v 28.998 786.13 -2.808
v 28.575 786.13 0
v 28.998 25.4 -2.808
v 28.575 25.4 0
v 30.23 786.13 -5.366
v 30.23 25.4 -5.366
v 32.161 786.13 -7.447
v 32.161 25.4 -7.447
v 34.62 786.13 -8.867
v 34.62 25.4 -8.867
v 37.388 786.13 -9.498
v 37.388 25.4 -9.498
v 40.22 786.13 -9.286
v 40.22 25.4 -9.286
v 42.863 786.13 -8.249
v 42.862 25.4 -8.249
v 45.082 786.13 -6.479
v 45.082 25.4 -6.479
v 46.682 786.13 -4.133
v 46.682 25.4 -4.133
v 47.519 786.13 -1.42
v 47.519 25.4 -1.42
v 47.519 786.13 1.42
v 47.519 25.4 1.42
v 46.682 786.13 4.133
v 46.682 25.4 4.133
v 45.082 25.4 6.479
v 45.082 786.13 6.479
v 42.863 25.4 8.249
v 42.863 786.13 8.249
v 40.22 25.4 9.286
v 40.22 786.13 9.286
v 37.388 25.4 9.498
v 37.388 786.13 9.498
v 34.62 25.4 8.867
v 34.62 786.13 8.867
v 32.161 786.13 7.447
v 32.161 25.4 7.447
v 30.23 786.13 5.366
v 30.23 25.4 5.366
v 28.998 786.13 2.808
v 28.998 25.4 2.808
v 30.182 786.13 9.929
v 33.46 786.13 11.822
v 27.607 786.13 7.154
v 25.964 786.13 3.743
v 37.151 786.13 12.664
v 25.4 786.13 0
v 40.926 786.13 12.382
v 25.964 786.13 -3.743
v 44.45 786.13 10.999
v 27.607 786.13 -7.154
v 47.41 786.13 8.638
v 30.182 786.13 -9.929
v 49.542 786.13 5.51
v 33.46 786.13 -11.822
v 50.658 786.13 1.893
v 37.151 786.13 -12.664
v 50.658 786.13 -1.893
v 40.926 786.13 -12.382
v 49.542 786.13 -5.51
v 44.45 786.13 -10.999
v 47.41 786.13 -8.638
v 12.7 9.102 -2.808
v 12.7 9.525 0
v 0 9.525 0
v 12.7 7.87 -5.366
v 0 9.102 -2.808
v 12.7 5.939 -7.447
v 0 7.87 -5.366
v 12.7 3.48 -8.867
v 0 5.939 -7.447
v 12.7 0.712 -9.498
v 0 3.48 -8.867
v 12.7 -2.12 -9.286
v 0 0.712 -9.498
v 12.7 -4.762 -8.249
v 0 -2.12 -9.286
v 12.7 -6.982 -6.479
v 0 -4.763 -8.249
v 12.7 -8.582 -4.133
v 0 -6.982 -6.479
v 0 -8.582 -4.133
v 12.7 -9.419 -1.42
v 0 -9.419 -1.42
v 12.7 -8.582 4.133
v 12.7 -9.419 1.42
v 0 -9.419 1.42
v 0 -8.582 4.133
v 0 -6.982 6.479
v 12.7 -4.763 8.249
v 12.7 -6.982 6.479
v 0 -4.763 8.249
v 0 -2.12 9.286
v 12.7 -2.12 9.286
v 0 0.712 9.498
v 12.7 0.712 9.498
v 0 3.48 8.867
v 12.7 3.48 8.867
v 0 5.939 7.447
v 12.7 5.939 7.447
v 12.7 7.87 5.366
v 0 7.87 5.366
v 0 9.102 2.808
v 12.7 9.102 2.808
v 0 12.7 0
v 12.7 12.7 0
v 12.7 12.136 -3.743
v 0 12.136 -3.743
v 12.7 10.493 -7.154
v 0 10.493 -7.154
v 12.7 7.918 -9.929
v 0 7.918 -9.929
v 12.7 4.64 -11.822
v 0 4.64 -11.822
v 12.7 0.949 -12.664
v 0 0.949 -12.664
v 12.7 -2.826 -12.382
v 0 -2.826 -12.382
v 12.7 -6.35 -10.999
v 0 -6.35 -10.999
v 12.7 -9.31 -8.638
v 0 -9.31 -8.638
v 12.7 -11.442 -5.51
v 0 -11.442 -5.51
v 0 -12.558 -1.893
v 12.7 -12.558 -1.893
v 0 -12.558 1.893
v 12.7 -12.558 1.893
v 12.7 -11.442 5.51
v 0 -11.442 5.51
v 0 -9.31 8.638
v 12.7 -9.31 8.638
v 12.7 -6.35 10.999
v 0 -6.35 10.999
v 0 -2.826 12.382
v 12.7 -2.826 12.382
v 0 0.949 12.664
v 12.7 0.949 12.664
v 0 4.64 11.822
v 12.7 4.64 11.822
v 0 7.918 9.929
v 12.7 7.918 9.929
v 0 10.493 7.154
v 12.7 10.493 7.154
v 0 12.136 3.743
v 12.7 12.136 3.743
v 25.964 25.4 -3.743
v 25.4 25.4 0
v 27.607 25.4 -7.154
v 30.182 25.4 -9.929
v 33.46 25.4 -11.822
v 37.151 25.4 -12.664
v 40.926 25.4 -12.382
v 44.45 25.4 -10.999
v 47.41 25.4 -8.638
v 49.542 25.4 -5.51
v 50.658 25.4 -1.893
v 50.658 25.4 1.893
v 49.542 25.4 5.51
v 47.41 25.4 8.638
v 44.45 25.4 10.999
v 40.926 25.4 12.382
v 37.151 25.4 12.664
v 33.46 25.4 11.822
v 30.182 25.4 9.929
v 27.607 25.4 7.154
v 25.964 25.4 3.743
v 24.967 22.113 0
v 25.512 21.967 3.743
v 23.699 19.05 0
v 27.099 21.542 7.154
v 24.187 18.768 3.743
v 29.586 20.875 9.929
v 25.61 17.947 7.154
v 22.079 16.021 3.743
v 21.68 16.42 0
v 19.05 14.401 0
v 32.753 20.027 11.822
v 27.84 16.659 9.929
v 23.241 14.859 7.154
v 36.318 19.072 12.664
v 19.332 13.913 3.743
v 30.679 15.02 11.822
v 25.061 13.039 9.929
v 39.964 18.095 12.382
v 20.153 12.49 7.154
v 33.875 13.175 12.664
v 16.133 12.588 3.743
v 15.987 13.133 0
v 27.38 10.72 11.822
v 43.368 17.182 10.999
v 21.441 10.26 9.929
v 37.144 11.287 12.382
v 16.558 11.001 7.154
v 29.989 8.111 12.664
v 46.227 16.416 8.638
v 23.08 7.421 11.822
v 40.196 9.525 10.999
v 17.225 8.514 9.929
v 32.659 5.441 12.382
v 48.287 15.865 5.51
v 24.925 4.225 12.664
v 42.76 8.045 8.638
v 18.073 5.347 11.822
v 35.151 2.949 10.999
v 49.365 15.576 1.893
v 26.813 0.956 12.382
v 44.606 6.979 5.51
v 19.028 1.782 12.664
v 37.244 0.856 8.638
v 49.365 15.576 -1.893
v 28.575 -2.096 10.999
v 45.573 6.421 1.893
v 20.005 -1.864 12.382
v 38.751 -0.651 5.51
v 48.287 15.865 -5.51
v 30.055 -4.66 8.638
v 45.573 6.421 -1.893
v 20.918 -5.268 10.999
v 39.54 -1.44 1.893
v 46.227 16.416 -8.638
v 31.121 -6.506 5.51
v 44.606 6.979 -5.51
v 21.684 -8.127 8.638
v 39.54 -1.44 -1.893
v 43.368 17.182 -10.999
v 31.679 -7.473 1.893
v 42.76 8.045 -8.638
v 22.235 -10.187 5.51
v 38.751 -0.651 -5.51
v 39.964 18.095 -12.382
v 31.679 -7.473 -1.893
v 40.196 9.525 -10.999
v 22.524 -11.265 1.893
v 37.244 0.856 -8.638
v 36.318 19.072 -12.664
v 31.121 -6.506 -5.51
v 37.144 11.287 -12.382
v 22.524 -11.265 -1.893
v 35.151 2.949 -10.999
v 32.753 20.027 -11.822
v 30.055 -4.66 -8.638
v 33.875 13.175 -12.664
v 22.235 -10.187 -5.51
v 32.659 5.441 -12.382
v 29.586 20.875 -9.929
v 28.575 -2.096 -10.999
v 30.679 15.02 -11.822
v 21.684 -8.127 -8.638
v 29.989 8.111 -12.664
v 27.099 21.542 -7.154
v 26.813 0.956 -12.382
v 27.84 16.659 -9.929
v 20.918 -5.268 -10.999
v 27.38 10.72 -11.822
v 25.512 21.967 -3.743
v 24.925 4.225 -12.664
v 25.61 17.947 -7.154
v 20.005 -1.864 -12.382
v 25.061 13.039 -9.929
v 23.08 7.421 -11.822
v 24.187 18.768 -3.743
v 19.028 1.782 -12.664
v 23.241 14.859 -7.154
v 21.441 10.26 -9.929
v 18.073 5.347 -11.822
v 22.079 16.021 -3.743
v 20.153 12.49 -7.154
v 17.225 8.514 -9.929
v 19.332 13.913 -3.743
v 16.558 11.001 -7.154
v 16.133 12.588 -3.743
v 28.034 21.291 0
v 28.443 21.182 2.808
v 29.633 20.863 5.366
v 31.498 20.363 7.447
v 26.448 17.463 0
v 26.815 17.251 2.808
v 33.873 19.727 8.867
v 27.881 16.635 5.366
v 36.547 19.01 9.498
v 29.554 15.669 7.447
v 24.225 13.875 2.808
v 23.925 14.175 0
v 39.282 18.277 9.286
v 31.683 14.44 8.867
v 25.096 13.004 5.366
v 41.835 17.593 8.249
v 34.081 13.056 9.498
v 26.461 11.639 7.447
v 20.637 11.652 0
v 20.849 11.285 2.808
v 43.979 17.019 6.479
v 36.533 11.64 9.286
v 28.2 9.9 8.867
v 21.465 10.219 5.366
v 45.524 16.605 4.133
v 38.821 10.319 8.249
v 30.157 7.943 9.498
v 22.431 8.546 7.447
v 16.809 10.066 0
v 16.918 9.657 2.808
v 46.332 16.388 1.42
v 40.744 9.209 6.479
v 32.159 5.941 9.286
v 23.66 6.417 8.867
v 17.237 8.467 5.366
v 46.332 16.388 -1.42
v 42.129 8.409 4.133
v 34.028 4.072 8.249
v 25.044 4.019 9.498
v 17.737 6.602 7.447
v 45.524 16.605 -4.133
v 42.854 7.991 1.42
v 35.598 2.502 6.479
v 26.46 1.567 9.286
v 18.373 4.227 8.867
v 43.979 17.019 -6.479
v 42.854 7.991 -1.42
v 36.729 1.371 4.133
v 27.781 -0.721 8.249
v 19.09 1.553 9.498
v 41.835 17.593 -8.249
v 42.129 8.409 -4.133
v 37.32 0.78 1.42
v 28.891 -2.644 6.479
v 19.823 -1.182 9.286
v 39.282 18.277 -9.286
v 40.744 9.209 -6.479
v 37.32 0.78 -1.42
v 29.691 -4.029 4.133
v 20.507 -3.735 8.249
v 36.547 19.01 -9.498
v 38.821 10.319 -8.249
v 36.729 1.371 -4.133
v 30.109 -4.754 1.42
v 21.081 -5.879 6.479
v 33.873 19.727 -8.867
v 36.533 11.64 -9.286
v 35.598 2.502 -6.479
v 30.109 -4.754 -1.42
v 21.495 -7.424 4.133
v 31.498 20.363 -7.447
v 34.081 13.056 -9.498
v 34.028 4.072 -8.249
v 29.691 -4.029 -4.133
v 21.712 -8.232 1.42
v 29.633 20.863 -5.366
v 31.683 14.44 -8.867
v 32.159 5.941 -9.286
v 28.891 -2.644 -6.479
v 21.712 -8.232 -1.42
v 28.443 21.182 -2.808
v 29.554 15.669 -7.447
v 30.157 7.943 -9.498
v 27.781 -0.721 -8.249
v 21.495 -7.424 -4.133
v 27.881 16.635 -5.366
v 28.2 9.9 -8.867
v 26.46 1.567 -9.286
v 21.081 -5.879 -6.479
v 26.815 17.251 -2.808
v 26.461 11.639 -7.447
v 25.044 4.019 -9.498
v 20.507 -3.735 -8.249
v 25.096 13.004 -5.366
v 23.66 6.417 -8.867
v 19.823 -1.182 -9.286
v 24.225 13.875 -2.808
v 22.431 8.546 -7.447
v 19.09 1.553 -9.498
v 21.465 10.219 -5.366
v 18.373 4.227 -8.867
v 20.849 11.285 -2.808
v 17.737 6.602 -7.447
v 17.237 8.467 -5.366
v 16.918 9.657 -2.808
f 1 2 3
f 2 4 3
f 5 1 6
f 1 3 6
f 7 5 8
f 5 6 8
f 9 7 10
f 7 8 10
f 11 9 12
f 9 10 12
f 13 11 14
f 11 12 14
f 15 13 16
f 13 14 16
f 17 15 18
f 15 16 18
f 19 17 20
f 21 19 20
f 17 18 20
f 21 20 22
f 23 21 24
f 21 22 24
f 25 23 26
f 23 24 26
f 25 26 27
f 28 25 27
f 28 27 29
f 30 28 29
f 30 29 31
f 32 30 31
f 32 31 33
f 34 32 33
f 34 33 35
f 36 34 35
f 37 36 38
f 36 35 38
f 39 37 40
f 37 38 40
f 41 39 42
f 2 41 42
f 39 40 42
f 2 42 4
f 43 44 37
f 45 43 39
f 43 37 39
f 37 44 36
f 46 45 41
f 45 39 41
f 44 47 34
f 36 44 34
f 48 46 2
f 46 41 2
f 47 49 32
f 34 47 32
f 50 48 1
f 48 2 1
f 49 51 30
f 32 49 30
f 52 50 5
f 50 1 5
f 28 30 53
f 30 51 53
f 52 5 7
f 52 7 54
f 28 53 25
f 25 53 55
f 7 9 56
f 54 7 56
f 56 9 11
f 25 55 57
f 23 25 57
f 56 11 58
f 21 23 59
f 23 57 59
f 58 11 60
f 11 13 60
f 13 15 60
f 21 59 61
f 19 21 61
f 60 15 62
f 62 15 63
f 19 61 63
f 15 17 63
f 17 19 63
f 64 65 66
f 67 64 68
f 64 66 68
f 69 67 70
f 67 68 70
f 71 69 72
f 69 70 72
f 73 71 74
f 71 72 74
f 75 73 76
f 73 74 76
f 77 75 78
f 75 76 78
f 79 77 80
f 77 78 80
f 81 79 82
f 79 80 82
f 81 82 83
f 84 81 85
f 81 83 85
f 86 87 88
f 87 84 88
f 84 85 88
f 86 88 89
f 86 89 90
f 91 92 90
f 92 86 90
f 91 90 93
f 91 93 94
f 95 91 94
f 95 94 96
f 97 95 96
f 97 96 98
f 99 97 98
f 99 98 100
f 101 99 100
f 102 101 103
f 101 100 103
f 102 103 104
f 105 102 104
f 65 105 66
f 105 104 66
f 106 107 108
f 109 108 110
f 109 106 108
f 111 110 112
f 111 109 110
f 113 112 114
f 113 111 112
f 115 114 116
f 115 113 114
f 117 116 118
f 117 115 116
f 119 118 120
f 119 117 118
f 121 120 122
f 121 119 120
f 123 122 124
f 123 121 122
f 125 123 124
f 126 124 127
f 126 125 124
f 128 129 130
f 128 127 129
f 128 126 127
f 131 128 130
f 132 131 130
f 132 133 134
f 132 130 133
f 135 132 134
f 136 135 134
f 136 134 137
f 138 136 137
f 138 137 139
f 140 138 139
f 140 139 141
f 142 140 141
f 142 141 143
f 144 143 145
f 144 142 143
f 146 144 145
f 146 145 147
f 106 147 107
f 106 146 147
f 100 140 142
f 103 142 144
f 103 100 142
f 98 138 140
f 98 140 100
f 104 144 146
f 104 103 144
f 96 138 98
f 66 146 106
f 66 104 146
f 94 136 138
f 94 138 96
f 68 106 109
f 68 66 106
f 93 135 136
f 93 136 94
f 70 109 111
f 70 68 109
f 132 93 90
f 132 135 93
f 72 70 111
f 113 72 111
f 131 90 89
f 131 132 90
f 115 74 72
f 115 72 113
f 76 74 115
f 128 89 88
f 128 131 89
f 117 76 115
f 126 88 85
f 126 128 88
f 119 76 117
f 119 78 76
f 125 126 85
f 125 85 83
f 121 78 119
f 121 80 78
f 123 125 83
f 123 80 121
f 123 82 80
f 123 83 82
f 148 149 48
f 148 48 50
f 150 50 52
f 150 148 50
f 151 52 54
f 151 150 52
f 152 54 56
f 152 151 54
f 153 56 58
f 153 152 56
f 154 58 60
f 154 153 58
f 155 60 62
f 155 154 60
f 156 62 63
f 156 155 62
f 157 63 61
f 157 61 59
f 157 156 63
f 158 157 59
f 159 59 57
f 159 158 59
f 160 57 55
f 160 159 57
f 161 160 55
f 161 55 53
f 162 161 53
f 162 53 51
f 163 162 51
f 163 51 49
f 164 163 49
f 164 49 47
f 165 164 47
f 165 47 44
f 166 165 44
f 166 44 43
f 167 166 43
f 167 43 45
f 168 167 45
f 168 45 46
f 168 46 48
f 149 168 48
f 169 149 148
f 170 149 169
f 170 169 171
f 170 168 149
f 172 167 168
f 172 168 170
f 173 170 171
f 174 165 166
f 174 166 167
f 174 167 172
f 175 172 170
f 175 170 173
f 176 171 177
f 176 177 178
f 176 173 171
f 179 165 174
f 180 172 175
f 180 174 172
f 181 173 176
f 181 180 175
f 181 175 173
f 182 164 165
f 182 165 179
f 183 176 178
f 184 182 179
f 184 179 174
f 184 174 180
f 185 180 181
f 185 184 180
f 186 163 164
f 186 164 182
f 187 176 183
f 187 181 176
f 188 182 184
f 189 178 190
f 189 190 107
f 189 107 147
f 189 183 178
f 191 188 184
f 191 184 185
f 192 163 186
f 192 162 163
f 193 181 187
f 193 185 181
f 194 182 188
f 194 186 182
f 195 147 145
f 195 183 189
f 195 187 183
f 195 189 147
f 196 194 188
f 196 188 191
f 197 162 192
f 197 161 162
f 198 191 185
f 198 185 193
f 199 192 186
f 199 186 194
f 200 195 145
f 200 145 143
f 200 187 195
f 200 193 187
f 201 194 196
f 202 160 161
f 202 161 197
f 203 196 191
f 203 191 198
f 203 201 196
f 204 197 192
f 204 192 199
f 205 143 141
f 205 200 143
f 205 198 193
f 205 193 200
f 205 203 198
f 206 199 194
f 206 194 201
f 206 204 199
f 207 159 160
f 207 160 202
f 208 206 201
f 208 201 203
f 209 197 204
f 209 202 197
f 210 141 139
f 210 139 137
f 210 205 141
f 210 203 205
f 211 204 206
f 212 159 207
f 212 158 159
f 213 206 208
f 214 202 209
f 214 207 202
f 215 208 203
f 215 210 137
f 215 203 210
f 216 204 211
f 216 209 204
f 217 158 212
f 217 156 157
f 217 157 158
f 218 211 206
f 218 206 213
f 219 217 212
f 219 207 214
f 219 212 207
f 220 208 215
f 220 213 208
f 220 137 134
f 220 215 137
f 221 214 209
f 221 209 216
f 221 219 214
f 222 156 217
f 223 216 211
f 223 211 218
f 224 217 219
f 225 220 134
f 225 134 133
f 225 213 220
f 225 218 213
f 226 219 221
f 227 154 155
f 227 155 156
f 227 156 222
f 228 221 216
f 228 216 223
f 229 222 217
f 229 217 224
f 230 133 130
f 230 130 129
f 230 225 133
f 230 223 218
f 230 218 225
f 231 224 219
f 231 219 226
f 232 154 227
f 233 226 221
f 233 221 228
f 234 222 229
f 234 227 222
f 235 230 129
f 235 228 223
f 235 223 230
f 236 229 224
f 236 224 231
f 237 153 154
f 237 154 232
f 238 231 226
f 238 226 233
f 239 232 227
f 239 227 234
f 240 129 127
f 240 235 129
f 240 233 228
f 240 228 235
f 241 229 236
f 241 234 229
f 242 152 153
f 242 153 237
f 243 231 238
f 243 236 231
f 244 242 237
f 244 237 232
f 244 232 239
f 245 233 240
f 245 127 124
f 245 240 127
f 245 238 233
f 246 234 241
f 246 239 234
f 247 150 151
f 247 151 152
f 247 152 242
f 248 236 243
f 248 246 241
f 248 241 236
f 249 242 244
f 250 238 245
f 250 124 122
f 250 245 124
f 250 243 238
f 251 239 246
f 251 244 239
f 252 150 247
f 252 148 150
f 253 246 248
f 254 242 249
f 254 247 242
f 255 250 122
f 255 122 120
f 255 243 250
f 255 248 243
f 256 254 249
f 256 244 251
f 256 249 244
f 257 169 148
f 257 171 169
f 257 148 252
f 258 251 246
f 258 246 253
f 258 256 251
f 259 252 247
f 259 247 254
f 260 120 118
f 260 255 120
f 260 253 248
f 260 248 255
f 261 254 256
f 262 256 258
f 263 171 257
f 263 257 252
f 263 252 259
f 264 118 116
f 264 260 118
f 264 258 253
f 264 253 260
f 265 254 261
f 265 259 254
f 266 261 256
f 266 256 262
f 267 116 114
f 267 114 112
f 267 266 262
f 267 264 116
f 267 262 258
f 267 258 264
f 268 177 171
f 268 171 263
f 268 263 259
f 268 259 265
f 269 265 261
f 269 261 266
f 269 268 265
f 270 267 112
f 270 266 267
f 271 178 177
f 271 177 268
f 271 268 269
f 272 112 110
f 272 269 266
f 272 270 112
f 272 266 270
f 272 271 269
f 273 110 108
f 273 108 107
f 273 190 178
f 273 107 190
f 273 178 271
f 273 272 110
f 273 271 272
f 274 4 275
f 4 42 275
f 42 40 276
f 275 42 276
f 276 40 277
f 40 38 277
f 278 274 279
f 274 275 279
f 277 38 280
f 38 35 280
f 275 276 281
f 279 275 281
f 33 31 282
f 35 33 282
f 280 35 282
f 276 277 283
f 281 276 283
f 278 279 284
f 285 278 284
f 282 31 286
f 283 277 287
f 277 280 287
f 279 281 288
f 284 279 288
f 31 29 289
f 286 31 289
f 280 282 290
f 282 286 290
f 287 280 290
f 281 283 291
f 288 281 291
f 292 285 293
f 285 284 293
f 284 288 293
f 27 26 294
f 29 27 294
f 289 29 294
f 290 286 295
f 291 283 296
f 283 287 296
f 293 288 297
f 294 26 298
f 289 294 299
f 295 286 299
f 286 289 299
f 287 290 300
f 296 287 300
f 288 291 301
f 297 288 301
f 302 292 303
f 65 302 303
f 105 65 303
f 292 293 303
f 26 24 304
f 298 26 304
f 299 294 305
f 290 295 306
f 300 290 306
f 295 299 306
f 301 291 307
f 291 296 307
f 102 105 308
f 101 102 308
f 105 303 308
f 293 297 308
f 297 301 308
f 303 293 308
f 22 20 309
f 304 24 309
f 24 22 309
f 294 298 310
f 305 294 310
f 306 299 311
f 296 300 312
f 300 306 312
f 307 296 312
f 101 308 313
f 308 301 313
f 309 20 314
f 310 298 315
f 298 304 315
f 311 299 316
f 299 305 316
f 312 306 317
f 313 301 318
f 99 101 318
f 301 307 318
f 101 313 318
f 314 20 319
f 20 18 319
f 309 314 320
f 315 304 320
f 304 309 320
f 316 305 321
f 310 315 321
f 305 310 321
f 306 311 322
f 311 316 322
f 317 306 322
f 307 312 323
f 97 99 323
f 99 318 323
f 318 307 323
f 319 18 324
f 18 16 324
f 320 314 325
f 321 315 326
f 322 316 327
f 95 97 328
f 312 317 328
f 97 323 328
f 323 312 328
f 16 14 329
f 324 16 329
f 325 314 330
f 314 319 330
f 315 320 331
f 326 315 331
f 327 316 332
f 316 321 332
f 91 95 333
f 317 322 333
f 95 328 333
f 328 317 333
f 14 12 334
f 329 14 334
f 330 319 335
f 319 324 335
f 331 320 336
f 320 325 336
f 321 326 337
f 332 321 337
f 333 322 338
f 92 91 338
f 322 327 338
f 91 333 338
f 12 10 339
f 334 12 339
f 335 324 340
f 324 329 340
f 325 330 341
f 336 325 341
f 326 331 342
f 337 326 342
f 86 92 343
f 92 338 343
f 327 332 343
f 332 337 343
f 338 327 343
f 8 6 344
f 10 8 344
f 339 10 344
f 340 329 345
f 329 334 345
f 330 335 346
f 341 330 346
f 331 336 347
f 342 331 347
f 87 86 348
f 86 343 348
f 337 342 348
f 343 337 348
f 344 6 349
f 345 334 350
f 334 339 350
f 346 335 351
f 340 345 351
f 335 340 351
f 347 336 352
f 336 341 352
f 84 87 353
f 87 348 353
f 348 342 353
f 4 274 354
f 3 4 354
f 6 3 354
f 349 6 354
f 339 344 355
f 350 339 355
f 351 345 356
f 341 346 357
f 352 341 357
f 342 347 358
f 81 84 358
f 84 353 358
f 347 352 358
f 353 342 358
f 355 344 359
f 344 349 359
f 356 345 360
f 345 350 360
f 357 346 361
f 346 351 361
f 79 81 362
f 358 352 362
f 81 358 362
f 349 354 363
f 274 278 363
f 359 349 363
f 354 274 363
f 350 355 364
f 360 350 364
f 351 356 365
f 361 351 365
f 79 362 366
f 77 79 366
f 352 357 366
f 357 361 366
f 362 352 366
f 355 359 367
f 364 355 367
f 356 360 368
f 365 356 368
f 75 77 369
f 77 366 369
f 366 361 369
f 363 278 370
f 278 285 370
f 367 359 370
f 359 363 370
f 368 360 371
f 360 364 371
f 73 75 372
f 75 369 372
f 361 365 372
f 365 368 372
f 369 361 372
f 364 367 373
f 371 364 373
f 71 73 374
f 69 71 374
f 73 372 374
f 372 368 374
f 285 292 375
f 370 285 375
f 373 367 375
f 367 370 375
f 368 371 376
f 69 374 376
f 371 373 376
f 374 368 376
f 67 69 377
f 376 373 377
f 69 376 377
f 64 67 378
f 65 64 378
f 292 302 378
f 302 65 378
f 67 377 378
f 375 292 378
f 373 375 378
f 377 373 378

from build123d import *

# Parameters (mm, degrees)
SWEEP1_PROFILE_R = 12.7
SHELL2_T         = -3.175


with BuildPart() as part:
    # Sweep1: sweep along a path in Sketch1
    with BuildLine(Plane.XY) as sweep1_path:
        Line((38.1, 786.13), (38.1, 25.4))
        ThreePointArc((38.1, 25.4), (30.660512242, 7.439487758), (12.7, 0))
        Line((12.7, 0), (0, 0))
    # Sweep1 profile (on start of the path) → Sweep1 (sweep)
    with BuildSketch(Plane(origin=(38.1, 786.13, 0), x_dir=(-1, 0, 0), z_dir=(0, -1, 0))):
        Circle(SWEEP1_PROFILE_R)
    sweep(path=sweep1_path.line)

    # Shell2
    shell2_openings = [part.faces().sort_by_distance(p)[0] for p in [
        (0, 0, 0),
        (38.1, 786.13, 0),
    ]]
    offset(amount=SHELL2_T, openings=shell2_openings, kind=Kind.INTERSECTION)


solid = part.part
